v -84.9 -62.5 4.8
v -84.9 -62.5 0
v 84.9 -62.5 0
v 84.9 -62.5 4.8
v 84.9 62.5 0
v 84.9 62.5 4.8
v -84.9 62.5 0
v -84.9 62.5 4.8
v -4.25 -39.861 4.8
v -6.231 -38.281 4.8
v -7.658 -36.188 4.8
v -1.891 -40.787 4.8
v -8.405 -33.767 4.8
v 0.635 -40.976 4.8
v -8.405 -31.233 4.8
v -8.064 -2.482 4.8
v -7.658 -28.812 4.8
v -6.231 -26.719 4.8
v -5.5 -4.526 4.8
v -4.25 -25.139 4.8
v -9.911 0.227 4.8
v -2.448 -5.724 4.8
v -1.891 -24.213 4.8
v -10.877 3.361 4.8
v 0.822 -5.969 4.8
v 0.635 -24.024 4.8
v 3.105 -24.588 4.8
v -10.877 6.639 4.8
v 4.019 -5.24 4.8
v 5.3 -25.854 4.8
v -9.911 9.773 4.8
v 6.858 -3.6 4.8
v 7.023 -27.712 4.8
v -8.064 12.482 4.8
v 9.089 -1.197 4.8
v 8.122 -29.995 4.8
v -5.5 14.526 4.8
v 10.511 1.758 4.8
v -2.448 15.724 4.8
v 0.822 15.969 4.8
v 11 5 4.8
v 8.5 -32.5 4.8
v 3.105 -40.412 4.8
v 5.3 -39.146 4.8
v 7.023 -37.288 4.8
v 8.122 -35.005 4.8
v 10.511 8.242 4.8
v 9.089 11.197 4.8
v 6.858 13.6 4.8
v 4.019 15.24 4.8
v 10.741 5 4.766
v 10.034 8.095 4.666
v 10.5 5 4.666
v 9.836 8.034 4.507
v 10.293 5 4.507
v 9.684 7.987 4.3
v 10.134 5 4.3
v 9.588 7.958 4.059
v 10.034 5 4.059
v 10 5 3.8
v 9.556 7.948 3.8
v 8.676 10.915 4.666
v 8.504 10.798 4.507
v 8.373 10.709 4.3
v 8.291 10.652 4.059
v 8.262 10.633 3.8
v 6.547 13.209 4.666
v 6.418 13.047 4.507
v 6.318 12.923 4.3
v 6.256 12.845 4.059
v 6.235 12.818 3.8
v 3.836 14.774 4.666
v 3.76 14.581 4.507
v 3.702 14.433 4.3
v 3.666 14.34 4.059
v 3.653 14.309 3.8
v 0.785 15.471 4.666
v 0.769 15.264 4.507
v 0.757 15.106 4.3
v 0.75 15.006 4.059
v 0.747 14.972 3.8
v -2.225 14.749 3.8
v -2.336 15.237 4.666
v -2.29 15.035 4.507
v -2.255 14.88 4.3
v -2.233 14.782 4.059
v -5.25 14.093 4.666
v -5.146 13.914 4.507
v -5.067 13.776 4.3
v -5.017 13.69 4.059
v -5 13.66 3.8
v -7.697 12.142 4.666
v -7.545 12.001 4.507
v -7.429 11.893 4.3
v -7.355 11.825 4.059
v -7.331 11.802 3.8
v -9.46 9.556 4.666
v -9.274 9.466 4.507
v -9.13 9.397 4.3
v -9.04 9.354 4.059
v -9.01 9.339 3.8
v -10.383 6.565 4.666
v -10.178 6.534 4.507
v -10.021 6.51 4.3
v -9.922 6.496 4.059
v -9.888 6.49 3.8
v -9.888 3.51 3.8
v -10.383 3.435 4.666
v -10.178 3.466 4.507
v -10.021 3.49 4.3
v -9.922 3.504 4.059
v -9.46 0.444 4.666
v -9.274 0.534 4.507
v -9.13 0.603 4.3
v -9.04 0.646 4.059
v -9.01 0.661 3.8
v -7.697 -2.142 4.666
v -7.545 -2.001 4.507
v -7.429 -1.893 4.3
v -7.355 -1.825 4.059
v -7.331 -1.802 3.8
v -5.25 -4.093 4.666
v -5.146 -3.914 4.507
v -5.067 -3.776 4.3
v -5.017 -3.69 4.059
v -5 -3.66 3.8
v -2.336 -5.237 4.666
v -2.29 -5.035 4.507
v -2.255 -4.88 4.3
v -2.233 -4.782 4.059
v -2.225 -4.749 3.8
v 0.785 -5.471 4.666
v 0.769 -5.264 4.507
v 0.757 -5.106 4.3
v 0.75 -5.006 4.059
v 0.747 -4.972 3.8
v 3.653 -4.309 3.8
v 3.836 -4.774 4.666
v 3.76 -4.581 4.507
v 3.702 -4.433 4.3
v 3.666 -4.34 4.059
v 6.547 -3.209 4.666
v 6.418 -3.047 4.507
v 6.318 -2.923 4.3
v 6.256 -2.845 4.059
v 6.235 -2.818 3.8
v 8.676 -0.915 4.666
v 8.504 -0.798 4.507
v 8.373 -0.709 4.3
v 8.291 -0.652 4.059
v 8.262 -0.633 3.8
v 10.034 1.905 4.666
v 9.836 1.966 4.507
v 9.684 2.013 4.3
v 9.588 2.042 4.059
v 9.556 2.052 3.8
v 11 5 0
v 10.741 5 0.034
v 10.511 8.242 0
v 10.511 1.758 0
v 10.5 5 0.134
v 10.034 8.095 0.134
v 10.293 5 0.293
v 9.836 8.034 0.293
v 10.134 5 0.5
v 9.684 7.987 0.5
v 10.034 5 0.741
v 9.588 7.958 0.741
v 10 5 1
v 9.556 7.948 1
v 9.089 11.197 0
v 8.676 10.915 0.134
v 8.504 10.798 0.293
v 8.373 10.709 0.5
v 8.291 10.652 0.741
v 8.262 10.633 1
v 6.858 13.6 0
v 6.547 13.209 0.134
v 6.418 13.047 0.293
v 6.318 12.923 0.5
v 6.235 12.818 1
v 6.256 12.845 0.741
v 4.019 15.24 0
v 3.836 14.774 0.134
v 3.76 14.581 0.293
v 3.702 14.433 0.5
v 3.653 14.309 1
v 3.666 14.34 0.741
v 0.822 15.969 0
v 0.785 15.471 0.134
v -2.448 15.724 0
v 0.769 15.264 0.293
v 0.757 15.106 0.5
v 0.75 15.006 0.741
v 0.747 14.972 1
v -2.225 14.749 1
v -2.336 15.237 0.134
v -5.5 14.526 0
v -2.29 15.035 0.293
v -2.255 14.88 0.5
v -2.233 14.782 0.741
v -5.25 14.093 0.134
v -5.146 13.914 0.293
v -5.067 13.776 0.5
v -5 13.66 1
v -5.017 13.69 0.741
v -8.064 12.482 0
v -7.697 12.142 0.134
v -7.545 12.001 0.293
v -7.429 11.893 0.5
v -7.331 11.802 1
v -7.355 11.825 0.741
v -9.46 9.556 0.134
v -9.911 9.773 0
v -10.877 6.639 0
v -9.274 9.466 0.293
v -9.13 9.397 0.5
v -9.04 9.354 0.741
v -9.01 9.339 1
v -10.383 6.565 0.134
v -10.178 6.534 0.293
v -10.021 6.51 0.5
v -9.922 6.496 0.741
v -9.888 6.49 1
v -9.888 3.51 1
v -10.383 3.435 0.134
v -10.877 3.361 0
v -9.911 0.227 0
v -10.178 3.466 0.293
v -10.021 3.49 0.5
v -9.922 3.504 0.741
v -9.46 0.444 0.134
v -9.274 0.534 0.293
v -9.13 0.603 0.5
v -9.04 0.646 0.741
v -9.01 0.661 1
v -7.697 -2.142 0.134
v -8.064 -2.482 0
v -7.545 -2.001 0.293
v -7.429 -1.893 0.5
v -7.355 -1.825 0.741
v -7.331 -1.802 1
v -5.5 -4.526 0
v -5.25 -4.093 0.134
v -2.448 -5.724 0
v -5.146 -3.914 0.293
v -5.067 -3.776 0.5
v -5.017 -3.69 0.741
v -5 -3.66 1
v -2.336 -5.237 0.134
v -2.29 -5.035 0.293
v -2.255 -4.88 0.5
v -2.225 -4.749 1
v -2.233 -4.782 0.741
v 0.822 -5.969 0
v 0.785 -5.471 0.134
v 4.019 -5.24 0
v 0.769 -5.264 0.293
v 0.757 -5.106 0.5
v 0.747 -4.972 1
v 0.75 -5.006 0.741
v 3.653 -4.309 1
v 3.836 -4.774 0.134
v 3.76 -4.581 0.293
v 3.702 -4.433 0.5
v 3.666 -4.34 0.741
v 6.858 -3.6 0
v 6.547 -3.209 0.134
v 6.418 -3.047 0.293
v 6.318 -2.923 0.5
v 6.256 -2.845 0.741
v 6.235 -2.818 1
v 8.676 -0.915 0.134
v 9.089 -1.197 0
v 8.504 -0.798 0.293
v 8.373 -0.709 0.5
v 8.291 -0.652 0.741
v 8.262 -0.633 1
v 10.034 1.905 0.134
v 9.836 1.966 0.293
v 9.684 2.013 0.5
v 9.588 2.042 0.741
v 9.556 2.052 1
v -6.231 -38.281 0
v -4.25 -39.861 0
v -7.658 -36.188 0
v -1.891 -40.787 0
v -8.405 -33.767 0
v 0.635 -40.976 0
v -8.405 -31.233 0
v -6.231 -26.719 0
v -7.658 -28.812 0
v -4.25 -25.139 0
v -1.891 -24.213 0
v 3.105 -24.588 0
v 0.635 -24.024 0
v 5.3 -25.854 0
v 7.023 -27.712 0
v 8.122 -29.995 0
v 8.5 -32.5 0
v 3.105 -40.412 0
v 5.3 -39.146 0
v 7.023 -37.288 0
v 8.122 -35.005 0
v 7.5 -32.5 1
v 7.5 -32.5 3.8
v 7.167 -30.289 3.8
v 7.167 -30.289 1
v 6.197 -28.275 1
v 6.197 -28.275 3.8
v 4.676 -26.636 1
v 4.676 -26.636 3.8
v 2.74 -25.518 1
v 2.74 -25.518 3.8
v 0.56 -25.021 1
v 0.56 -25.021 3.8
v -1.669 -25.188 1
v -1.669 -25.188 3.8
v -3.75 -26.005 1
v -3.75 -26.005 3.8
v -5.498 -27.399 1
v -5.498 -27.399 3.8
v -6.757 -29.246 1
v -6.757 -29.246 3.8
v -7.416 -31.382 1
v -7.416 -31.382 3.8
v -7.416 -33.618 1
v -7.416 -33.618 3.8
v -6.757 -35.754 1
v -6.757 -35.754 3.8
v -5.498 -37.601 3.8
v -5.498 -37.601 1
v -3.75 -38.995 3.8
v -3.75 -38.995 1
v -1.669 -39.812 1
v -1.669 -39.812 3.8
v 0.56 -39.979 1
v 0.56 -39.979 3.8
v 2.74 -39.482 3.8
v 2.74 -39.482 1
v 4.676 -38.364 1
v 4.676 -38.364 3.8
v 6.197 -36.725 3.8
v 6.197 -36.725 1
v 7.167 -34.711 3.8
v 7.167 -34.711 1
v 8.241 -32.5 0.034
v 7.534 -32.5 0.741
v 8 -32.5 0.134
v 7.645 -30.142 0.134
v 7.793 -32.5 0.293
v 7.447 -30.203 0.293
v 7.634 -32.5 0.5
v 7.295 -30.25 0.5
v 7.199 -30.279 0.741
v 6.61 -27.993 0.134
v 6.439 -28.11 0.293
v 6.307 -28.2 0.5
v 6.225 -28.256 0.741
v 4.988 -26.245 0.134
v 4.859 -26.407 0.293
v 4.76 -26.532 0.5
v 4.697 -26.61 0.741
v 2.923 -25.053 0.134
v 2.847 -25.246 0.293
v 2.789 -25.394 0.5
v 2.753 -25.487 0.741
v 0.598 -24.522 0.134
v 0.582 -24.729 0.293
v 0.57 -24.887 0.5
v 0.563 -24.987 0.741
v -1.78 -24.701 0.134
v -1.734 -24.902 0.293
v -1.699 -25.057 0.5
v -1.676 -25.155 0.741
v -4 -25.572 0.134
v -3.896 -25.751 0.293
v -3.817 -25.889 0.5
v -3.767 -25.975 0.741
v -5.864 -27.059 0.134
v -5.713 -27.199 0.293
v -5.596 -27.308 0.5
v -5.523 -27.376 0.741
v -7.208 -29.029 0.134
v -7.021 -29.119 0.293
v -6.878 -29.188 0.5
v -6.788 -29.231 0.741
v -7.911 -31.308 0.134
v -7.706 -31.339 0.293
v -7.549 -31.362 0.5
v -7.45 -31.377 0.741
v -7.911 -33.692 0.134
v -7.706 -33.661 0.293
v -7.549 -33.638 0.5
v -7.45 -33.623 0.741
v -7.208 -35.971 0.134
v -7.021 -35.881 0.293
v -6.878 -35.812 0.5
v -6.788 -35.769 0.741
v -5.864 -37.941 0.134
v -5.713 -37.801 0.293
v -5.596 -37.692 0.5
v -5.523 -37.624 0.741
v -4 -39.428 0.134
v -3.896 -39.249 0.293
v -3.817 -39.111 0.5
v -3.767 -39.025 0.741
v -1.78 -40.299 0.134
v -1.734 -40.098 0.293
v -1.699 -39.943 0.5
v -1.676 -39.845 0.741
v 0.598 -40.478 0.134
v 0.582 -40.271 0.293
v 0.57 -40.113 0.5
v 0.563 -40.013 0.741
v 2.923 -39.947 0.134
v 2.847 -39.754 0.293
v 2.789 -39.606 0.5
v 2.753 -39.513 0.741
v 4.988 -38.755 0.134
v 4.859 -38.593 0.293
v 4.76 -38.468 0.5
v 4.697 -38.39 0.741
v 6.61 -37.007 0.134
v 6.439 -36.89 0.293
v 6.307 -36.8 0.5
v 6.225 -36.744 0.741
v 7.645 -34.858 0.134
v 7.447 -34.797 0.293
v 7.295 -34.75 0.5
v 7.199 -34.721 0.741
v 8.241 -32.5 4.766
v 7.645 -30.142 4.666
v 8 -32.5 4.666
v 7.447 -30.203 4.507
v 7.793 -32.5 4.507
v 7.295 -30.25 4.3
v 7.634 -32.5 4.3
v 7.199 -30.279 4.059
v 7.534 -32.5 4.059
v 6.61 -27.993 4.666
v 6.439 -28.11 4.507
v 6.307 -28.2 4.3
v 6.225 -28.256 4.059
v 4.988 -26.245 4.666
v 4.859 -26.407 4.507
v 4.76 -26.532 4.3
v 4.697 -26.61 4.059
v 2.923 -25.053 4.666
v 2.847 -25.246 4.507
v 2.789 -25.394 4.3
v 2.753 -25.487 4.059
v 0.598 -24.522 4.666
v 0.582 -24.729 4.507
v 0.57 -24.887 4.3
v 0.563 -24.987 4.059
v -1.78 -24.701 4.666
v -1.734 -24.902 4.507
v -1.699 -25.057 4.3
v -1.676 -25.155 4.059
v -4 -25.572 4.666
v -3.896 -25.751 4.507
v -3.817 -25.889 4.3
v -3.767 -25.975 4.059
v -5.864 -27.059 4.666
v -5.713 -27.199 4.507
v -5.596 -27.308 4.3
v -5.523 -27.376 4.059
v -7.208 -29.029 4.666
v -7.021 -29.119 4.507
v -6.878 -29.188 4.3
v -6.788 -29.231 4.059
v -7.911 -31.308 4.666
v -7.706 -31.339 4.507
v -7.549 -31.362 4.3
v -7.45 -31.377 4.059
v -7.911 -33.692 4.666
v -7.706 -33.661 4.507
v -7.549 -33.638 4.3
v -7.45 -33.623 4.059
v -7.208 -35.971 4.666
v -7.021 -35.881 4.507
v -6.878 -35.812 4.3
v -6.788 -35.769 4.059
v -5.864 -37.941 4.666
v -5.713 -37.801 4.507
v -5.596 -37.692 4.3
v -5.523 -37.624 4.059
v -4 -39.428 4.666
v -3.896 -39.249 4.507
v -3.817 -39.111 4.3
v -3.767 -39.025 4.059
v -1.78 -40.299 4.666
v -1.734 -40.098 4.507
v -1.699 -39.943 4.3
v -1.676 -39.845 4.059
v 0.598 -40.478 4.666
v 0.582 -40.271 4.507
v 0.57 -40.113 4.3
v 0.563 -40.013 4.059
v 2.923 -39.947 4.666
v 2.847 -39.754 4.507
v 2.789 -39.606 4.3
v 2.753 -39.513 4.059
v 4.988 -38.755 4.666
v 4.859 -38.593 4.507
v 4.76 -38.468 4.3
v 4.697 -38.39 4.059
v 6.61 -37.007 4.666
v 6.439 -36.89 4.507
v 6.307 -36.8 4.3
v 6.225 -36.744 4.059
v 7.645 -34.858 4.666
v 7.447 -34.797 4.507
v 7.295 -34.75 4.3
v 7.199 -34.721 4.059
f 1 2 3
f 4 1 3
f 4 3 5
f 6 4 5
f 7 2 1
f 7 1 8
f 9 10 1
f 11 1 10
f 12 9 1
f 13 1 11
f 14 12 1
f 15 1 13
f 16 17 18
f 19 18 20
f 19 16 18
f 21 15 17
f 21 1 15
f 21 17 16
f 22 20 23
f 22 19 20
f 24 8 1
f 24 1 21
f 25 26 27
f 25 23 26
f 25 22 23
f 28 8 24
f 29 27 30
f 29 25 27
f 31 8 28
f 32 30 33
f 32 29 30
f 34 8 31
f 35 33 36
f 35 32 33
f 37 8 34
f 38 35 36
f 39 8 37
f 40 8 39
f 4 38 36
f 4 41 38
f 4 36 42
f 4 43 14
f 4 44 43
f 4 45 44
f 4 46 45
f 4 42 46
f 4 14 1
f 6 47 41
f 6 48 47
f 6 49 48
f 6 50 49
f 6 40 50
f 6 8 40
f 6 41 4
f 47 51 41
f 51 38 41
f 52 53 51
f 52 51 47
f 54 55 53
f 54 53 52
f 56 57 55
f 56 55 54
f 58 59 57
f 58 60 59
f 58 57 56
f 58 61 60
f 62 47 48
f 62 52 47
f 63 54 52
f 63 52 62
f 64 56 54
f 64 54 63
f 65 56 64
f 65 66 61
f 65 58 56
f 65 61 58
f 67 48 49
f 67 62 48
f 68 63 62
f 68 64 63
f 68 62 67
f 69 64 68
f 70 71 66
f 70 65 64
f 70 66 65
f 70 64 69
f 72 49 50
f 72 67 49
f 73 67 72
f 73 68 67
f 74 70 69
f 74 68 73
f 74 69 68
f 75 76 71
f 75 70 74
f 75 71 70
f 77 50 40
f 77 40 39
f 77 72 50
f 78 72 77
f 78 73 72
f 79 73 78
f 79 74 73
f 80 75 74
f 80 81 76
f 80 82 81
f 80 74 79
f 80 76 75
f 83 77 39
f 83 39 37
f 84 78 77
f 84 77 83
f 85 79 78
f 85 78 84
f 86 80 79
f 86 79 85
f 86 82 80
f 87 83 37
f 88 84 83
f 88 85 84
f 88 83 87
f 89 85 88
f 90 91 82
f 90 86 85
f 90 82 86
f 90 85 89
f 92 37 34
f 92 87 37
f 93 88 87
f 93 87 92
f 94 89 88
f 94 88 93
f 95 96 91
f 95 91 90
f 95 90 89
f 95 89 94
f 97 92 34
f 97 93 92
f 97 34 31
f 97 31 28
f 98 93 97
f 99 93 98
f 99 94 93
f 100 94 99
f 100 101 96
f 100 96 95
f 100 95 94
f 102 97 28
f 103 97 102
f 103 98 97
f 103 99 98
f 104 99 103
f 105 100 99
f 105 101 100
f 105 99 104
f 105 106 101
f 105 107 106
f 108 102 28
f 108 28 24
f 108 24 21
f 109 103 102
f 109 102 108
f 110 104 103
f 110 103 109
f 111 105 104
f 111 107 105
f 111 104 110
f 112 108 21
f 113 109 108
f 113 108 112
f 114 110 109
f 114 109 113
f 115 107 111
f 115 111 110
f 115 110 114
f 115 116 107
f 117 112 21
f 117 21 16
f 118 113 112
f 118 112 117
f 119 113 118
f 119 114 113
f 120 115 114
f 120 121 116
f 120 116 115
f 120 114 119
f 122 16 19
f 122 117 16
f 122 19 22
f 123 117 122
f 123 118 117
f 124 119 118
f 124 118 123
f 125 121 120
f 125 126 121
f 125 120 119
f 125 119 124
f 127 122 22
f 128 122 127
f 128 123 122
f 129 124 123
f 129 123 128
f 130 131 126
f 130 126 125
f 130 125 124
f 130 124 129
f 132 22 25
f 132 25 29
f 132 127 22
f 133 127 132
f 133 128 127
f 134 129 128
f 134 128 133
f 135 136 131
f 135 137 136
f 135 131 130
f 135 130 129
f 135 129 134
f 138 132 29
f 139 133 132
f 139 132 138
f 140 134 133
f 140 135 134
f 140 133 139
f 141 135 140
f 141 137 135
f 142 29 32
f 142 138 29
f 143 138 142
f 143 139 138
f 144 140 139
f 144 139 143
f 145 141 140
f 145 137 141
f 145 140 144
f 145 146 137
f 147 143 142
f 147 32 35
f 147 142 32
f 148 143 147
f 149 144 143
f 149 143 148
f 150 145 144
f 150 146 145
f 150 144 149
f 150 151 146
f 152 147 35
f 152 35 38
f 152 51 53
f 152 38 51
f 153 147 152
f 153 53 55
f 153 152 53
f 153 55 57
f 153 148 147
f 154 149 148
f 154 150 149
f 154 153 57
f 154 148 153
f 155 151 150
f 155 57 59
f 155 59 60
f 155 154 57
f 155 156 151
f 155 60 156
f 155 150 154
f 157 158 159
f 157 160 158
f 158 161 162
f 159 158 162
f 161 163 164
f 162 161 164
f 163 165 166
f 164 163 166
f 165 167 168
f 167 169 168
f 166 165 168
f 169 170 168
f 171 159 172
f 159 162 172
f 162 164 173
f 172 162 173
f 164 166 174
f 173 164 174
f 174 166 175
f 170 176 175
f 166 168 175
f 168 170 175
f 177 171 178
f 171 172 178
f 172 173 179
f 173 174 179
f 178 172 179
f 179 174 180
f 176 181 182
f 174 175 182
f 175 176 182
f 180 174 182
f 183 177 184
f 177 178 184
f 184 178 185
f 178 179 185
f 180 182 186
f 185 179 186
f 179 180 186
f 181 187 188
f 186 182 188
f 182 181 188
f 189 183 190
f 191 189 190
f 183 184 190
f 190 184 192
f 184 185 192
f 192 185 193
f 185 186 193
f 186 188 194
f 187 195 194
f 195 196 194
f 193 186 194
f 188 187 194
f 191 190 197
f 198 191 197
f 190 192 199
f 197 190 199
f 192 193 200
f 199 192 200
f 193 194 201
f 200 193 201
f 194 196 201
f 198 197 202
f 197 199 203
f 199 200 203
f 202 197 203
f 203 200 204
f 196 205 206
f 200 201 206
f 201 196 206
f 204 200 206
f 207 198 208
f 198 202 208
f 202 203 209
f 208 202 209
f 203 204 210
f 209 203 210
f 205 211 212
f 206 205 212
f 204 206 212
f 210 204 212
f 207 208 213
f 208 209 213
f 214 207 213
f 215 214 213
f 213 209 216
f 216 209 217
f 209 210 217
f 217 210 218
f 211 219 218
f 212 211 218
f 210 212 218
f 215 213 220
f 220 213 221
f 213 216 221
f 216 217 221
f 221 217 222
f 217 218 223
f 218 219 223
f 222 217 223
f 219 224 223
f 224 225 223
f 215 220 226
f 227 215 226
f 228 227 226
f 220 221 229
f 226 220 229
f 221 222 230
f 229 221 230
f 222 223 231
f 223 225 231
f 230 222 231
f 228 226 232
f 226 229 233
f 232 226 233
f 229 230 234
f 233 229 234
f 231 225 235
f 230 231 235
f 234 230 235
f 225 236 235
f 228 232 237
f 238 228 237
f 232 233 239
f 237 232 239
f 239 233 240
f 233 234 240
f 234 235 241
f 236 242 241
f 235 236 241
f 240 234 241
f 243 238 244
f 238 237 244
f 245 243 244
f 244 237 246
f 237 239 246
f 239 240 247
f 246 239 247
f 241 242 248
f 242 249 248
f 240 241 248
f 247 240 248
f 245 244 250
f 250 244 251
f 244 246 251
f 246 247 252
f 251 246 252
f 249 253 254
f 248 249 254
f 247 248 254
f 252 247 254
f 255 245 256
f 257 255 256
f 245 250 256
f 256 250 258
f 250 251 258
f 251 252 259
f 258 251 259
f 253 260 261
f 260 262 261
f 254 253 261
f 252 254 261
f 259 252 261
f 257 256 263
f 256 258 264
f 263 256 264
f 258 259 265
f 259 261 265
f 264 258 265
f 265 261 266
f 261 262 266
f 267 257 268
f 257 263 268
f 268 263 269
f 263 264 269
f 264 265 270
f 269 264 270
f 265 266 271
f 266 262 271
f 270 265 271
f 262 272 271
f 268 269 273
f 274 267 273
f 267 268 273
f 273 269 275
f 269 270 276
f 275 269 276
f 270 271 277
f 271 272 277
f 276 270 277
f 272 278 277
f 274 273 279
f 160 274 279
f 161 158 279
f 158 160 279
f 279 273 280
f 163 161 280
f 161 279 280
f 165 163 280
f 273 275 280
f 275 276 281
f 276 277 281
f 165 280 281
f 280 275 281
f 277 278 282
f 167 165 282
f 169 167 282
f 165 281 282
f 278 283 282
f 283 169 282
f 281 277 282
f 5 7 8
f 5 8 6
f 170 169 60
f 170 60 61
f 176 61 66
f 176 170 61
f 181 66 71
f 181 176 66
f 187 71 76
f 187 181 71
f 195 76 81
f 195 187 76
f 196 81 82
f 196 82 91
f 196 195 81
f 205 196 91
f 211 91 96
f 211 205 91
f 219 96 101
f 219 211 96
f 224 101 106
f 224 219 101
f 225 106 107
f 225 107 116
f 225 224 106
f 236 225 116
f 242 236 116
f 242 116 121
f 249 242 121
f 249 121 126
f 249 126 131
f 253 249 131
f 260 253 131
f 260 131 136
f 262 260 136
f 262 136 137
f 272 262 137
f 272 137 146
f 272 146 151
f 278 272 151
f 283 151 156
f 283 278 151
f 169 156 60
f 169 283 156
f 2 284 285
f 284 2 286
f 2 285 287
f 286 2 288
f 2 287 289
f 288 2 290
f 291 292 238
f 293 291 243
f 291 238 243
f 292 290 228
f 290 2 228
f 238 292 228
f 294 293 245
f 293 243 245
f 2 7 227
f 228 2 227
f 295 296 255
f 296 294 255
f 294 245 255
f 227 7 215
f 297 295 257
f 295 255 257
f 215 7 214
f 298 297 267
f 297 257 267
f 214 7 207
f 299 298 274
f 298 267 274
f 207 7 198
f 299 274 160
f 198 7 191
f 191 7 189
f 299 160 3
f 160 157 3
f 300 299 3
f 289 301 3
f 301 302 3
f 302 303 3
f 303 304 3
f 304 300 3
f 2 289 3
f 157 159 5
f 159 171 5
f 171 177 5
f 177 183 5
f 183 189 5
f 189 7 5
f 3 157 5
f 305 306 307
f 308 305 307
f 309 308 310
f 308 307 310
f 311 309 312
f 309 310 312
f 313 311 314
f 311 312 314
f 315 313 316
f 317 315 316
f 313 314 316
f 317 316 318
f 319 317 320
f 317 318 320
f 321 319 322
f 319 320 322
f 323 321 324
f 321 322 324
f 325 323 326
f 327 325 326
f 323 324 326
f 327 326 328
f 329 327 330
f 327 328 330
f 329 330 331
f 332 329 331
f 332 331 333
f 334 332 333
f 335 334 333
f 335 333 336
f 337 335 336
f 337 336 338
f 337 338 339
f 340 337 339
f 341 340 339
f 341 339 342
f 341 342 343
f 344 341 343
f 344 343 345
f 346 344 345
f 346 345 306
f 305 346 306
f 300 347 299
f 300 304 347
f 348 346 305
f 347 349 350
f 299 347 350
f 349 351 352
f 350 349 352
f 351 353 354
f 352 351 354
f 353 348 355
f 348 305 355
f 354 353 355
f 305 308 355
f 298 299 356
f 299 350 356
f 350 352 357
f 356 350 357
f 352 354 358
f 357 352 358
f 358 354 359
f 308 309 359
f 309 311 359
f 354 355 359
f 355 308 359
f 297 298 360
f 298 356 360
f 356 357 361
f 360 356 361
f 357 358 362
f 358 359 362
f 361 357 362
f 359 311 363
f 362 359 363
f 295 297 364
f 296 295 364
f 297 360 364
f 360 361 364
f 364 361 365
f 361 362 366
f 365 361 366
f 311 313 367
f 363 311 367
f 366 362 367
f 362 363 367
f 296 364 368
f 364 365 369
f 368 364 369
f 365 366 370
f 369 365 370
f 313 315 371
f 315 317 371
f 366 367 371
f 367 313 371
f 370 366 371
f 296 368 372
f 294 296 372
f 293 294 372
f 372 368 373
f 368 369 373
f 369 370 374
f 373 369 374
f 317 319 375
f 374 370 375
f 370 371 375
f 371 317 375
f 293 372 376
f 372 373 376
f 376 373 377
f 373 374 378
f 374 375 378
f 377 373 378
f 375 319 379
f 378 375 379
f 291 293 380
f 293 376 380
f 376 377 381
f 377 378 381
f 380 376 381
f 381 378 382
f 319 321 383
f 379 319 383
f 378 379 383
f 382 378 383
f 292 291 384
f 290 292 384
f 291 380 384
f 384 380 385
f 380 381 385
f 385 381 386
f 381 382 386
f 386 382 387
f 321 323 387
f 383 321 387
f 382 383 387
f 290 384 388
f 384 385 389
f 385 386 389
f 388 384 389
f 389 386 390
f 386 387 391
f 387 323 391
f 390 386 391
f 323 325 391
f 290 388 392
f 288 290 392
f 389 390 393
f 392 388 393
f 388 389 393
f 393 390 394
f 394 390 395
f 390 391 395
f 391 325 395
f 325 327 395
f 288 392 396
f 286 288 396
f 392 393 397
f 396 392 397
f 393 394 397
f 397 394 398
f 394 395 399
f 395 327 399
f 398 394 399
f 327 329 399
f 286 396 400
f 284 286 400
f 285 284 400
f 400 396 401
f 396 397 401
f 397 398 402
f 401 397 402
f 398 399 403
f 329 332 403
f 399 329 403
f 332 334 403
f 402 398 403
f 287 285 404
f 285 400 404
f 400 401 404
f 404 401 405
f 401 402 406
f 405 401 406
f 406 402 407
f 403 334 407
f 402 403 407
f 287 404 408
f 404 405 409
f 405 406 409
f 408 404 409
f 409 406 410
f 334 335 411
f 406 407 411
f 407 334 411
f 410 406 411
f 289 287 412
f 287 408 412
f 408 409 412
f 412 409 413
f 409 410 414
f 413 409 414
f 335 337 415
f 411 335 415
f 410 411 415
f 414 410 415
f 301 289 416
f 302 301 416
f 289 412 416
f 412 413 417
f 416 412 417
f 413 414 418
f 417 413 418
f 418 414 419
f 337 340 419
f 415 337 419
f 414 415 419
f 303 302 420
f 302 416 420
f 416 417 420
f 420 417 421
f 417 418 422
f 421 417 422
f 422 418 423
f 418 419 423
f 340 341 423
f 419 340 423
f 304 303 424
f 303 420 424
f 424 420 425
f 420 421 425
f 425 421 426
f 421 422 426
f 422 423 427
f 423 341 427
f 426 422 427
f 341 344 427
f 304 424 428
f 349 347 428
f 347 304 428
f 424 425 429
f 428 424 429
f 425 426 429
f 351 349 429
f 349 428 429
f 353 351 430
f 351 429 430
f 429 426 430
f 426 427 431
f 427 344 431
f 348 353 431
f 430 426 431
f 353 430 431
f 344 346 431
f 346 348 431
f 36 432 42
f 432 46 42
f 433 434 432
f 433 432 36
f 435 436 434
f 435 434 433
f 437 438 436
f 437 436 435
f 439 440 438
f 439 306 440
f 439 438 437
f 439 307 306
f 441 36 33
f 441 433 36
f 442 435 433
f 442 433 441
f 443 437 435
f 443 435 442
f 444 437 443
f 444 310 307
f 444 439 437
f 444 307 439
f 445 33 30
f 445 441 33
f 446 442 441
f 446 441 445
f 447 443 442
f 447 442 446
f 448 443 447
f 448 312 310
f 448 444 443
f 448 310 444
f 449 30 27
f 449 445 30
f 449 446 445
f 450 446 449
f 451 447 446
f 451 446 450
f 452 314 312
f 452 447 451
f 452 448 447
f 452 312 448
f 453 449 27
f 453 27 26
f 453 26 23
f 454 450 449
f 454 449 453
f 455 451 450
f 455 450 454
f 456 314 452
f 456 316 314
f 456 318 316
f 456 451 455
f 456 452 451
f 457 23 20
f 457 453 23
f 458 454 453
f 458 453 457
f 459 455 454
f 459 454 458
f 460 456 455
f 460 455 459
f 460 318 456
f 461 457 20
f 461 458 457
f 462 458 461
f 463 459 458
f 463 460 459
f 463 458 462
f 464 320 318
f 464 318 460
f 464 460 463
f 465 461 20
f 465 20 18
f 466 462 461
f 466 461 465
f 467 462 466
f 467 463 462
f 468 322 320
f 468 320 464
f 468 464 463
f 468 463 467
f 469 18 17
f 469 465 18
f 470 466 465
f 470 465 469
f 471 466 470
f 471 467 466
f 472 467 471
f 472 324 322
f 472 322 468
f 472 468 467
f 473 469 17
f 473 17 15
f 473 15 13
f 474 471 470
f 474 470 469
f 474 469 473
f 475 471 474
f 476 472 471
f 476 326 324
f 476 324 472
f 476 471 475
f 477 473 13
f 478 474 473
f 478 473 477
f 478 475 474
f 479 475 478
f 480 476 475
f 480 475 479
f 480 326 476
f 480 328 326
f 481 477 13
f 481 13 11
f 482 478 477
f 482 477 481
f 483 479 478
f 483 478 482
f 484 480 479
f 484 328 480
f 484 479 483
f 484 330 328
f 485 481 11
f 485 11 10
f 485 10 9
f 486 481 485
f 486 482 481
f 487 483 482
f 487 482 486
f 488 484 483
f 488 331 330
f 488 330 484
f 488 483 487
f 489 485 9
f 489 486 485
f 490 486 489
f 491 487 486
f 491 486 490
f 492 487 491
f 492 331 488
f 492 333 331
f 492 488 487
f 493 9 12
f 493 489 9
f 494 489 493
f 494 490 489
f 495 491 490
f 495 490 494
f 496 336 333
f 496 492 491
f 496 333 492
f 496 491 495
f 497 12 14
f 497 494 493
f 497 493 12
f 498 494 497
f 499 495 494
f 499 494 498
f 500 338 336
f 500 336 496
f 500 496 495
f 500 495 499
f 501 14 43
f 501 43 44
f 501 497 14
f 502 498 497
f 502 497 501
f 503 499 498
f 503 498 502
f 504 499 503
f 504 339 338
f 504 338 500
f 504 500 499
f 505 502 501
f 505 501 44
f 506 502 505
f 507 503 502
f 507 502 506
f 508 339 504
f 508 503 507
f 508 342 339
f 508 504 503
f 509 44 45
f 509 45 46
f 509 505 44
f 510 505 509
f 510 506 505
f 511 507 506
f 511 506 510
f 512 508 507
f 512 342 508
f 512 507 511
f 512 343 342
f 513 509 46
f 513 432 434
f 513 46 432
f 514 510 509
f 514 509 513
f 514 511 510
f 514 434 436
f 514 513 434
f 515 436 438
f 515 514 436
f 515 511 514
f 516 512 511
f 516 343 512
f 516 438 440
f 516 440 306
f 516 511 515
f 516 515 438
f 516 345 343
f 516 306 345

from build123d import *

# Parameters (mm, degrees)
SKETCH1_W           = 169.8
SKETCH1_H           = 125
SKETCH1_R           = 10
BOSS_EXTRUDE1_DEPTH = 4.8
SKETCH2_R           = 7.5
CUT_EXTRUDE1_DEPTH  = 5.8
FILLET1_R           = 1


with BuildPart() as part:
    # Sketch1 → Boss-Extrude1 (new body)
    with BuildSketch(Plane.XY):
        Rectangle(SKETCH1_W, SKETCH1_H)
        with Locations((0, 5)):
            Circle(SKETCH1_R, mode=Mode.SUBTRACT)
    extrude(amount=BOSS_EXTRUDE1_DEPTH)

    # Sketch2 → Cut-Extrude1 (cut, through all)
    with BuildSketch(Plane.XY.offset(4.8)):
        with Locations((0, -32.5)):
            Circle(SKETCH2_R)
    extrude(amount=-CUT_EXTRUDE1_DEPTH, mode=Mode.SUBTRACT)

    # Fillet1
    fillet1_edges = [part.edges().sort_by_distance(p)[0] for p in [
        (-10, 5, 0),
        (-10, 5, 4.8),
        (-7.5, -32.5, 0),
        (-7.5, -32.5, 4.8),
    ]]
    fillet(fillet1_edges, radius=FILLET1_R)


solid = part.part
